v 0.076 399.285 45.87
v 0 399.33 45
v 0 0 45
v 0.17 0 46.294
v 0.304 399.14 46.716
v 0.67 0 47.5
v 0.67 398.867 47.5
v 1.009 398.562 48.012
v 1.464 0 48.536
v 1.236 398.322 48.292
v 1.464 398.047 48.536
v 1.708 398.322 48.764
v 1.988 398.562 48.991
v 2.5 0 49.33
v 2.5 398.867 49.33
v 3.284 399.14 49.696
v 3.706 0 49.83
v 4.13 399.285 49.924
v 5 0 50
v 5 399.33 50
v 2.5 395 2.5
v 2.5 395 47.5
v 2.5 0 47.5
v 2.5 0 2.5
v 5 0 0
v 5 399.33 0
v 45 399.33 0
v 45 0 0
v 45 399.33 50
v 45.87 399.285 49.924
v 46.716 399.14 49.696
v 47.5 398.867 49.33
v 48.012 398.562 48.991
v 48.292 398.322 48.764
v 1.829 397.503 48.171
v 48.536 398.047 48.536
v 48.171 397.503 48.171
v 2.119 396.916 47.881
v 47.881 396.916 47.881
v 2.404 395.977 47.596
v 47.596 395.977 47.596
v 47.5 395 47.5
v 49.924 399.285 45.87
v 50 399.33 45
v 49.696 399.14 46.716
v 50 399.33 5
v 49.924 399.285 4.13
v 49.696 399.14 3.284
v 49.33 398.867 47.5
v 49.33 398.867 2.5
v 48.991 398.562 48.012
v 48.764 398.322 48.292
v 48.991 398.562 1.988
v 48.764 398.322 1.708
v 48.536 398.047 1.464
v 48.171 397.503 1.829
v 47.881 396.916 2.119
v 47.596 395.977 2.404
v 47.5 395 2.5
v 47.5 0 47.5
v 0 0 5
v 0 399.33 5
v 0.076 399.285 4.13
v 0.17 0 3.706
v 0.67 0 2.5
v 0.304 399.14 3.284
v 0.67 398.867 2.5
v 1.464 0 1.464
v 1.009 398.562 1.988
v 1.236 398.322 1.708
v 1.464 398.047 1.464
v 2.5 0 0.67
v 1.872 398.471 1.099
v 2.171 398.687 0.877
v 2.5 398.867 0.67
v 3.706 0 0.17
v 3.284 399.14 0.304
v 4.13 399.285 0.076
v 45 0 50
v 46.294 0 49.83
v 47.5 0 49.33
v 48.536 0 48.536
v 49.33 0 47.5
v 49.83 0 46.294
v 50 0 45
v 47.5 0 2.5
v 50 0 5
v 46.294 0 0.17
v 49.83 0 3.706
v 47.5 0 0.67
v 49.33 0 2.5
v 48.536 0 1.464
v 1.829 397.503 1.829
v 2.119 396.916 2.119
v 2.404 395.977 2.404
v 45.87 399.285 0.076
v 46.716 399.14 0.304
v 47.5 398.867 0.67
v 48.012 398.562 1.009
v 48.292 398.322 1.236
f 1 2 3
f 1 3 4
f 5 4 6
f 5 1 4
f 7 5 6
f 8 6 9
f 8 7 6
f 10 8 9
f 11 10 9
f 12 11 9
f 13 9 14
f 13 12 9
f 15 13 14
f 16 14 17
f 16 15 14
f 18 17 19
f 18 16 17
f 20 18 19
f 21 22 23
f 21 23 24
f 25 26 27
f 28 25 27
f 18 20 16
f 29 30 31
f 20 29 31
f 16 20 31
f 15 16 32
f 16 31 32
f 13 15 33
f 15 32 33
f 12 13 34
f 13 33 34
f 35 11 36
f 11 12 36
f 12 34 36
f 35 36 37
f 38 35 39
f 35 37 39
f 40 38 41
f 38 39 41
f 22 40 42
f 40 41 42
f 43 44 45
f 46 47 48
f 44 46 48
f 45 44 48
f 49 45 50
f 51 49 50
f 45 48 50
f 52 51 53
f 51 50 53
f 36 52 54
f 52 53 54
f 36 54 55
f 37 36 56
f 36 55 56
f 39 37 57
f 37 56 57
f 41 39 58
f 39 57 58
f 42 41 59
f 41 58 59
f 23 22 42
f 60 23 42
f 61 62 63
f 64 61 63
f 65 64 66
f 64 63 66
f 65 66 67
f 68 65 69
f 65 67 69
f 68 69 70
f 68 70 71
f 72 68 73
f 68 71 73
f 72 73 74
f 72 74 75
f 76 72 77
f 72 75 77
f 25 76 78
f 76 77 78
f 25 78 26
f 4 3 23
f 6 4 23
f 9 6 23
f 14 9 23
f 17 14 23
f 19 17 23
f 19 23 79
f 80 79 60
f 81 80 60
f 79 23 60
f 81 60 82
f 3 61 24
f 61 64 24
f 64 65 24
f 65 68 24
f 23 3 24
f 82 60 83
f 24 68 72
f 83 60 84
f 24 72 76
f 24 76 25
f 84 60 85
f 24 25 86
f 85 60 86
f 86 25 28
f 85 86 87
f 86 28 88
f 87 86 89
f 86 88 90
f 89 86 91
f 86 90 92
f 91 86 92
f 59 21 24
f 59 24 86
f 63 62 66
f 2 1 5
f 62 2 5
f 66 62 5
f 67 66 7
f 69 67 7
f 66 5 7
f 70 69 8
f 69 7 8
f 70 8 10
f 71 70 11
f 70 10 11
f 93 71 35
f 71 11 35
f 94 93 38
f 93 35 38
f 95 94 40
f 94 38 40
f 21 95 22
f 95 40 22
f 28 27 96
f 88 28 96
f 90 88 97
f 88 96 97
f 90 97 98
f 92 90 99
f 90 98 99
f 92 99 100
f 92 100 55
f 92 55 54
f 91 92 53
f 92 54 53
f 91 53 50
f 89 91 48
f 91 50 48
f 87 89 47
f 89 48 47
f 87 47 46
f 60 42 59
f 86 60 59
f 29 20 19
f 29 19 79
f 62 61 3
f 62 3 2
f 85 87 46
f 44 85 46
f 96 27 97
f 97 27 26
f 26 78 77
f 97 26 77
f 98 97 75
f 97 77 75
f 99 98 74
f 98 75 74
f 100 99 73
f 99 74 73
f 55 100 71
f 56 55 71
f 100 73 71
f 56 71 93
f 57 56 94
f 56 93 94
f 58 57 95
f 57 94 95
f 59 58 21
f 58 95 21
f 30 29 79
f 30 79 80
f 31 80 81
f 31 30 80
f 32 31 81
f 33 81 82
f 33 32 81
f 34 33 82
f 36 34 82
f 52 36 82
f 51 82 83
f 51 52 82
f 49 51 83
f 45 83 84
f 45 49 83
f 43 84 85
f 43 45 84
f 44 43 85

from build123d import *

# Parameters (mm, degrees)
SKETCH1_W           = 50
SKETCH1_H           = 400
BOSS_EXTRUDE1_DEPTH = 50
SKETCH2_W           = 45
SKETCH2_H           = 45
CUT_EXTRUDE1_DEPTH  = 407.201920232
FILLET1_R           = 5
FILLET2_R           = 5


with BuildPart() as part:
    # Sketch1 → Boss-Extrude1 (new body)
    with BuildSketch(Plane.XY):
        with Locations((25, 200)):
            Rectangle(SKETCH1_W, SKETCH1_H)
    extrude(amount=BOSS_EXTRUDE1_DEPTH)

    # Sketch2 → Cut-Extrude1 (cut, through all)
    with BuildSketch(Plane(origin=(0, 400, 0), x_dir=(1, 0, 0), z_dir=(0, 1, 0))):
        with Locations((25, -25)):
            Rectangle(SKETCH2_W, SKETCH2_H)
    extrude(amount=-CUT_EXTRUDE1_DEPTH, mode=Mode.SUBTRACT)

    # Fillet1
    fillet1_edges = [part.edges().sort_by_distance(p)[0] for p in [
        (50, 200, 50),
        (0, 200, 50),
        (50, 200, 0),
        (0, 200, 0),
    ]]
    fillet(fillet1_edges, radius=FILLET1_R)

    # Fillet2
    # the kernel refuses this fillet: 5 mm, written as the material it takes off along each edge
    with BuildSketch(Plane(origin=(47.5, 400, 2.5), x_dir=(0, -1, 0), z_dir=(0, 0, 1)), Plane(origin=(47.5, 400, 47.5), x_dir=(0, -1, 0), z_dir=(-1, 0, 0)), Plane(origin=(2.5, 400, 47.5), x_dir=(0, -1, 0), z_dir=(0, 0, -1)), Plane(origin=(2.5, 400, 2.5), x_dir=(0, -1, 0), z_dir=(1, 0, 0))) as fillet2_piece_1:
        with BuildLine():
            CenterArc((FILLET2_R, FILLET2_R), FILLET2_R, 180, 90)
            Line((0, FILLET2_R), (-FILLET2_R * 0.02, FILLET2_R))
            Line((-FILLET2_R * 0.02, FILLET2_R), (-FILLET2_R * 0.02, -FILLET2_R * 0.02))
            Line((-FILLET2_R * 0.02, -FILLET2_R * 0.02), (FILLET2_R, -FILLET2_R * 0.02))
            Line((FILLET2_R, -FILLET2_R * 0.02), (FILLET2_R, 0))
        make_face()
    extrude(amount=45, mode=Mode.SUBTRACT)
    with BuildSketch(Plane(origin=(47.5, 400, -10), x_dir=(0, -1, 0), z_dir=(0, 0, 1))) as fillet2_piece_2a_section:
        with BuildLine():
            CenterArc((FILLET2_R, FILLET2_R), FILLET2_R, 180, 90)
            Line((0, FILLET2_R), (-FILLET2_R * 0.02, FILLET2_R))
            Line((-FILLET2_R * 0.02, FILLET2_R), (-FILLET2_R * 0.02, -FILLET2_R * 0.02))
            Line((-FILLET2_R * 0.02, -FILLET2_R * 0.02), (FILLET2_R, -FILLET2_R * 0.02))
            Line((FILLET2_R, -FILLET2_R * 0.02), (FILLET2_R, 0))
        make_face()
    fillet2_piece_2a = extrude(amount=57.5, mode=Mode.PRIVATE)
    fillet2_piece_2a = split(fillet2_piece_2a, bisect_by=Plane(origin=(48.631975571, 398.868024429, 2.5), z_dir=(0, 0, -1)), keep=Keep.TOP, mode=Mode.PRIVATE)
    with BuildSketch(Plane(origin=(2.5, 400, 2.5), x_dir=(0, -1, 0), z_dir=(1, 0, 0))) as fillet2_piece_2b_section:
        with BuildLine():
            CenterArc((FILLET2_R, FILLET2_R), FILLET2_R, 180, 90)
            Line((0, FILLET2_R), (-FILLET2_R * 0.02, FILLET2_R))
            Line((-FILLET2_R * 0.02, FILLET2_R), (-FILLET2_R * 0.02, -FILLET2_R * 0.02))
            Line((-FILLET2_R * 0.02, -FILLET2_R * 0.02), (FILLET2_R, -FILLET2_R * 0.02))
            Line((FILLET2_R, -FILLET2_R * 0.02), (FILLET2_R, 0))
        make_face()
    fillet2_piece_2b = extrude(amount=57.5, mode=Mode.PRIVATE)
    fillet2_piece_2b = split(fillet2_piece_2b, bisect_by=Plane(origin=(47.5, 398.868024429, 1.368024429), z_dir=(1, 0, 0)), keep=Keep.TOP, mode=Mode.PRIVATE)
    fillet2_piece_2 = fillet2_piece_2a & fillet2_piece_2b
    add(fillet2_piece_2, mode=Mode.SUBTRACT)
    with BuildSketch(Plane(origin=(60, 400, 47.5), x_dir=(0, -1, 0), z_dir=(-1, 0, 0))) as fillet2_piece_3a_section:
        with BuildLine():
            CenterArc((FILLET2_R, FILLET2_R), FILLET2_R, 180, 90)
            Line((0, FILLET2_R), (-FILLET2_R * 0.02, FILLET2_R))
            Line((-FILLET2_R * 0.02, FILLET2_R), (-FILLET2_R * 0.02, -FILLET2_R * 0.02))
            Line((-FILLET2_R * 0.02, -FILLET2_R * 0.02), (FILLET2_R, -FILLET2_R * 0.02))
            Line((FILLET2_R, -FILLET2_R * 0.02), (FILLET2_R, 0))
        make_face()
    fillet2_piece_3a = extrude(amount=57.5, mode=Mode.PRIVATE)
    fillet2_piece_3a = split(fillet2_piece_3a, bisect_by=Plane(origin=(47.5, 398.868024429, 48.631975571), z_dir=(1, 0, 0)), keep=Keep.TOP, mode=Mode.PRIVATE)
    with BuildSketch(Plane(origin=(47.5, 400, 2.5), x_dir=(0, -1, 0), z_dir=(0, 0, 1))) as fillet2_piece_3b_section:
        with BuildLine():
            CenterArc((FILLET2_R, FILLET2_R), FILLET2_R, 180, 90)
            Line((0, FILLET2_R), (-FILLET2_R * 0.02, FILLET2_R))
            Line((-FILLET2_R * 0.02, FILLET2_R), (-FILLET2_R * 0.02, -FILLET2_R * 0.02))
            Line((-FILLET2_R * 0.02, -FILLET2_R * 0.02), (FILLET2_R, -FILLET2_R * 0.02))
            Line((FILLET2_R, -FILLET2_R * 0.02), (FILLET2_R, 0))
        make_face()
    fillet2_piece_3b = extrude(amount=57.5, mode=Mode.PRIVATE)
    fillet2_piece_3b = split(fillet2_piece_3b, bisect_by=Plane(origin=(48.631975571, 398.868024429, 47.5), z_dir=(0, 0, 1)), keep=Keep.TOP, mode=Mode.PRIVATE)
    fillet2_piece_3 = fillet2_piece_3a & fillet2_piece_3b
    add(fillet2_piece_3, mode=Mode.SUBTRACT)
    with BuildSketch(Plane(origin=(2.5, 400, 60), x_dir=(0, -1, 0), z_dir=(0, 0, -1))) as fillet2_piece_4a_section:
        with BuildLine():
            CenterArc((FILLET2_R, FILLET2_R), FILLET2_R, 180, 90)
            Line((0, FILLET2_R), (-FILLET2_R * 0.02, FILLET2_R))
            Line((-FILLET2_R * 0.02, FILLET2_R), (-FILLET2_R * 0.02, -FILLET2_R * 0.02))
            Line((-FILLET2_R * 0.02, -FILLET2_R * 0.02), (FILLET2_R, -FILLET2_R * 0.02))
            Line((FILLET2_R, -FILLET2_R * 0.02), (FILLET2_R, 0))
        make_face()
    fillet2_piece_4a = extrude(amount=57.5, mode=Mode.PRIVATE)
    fillet2_piece_4a = split(fillet2_piece_4a, bisect_by=Plane(origin=(1.368024429, 398.868024429, 47.5), z_dir=(0, 0, 1)), keep=Keep.TOP, mode=Mode.PRIVATE)
    with BuildSketch(Plane(origin=(47.5, 400, 47.5), x_dir=(0, -1, 0), z_dir=(-1, 0, 0))) as fillet2_piece_4b_section:
        with BuildLine():
            CenterArc((FILLET2_R, FILLET2_R), FILLET2_R, 180, 90)
            Line((0, FILLET2_R), (-FILLET2_R * 0.02, FILLET2_R))
            Line((-FILLET2_R * 0.02, FILLET2_R), (-FILLET2_R * 0.02, -FILLET2_R * 0.02))
            Line((-FILLET2_R * 0.02, -FILLET2_R * 0.02), (FILLET2_R, -FILLET2_R * 0.02))
            Line((FILLET2_R, -FILLET2_R * 0.02), (FILLET2_R, 0))
        make_face()
    fillet2_piece_4b = extrude(amount=57.5, mode=Mode.PRIVATE)
    fillet2_piece_4b = split(fillet2_piece_4b, bisect_by=Plane(origin=(2.5, 398.868024429, 48.631975571), z_dir=(-1, 0, 0)), keep=Keep.TOP, mode=Mode.PRIVATE)
    fillet2_piece_4 = fillet2_piece_4a & fillet2_piece_4b
    add(fillet2_piece_4, mode=Mode.SUBTRACT)
    with BuildSketch(Plane(origin=(2.5, 400, 47.5), x_dir=(0, -1, 0), z_dir=(0, 0, -1))) as fillet2_piece_5a_section:
        with BuildLine():
            CenterArc((FILLET2_R, FILLET2_R), FILLET2_R, 180, 90)
            Line((0, FILLET2_R), (-FILLET2_R * 0.02, FILLET2_R))
            Line((-FILLET2_R * 0.02, FILLET2_R), (-FILLET2_R * 0.02, -FILLET2_R * 0.02))
            Line((-FILLET2_R * 0.02, -FILLET2_R * 0.02), (FILLET2_R, -FILLET2_R * 0.02))
            Line((FILLET2_R, -FILLET2_R * 0.02), (FILLET2_R, 0))
        make_face()
    fillet2_piece_5a = extrude(amount=57.5, mode=Mode.PRIVATE)
    fillet2_piece_5a = split(fillet2_piece_5a, bisect_by=Plane(origin=(1.368024429, 398.868024429, 2.5), z_dir=(0, 0, -1)), keep=Keep.TOP, mode=Mode.PRIVATE)
    with BuildSketch(Plane(origin=(-10, 400, 2.5), x_dir=(0, -1, 0), z_dir=(1, 0, 0))) as fillet2_piece_5b_section:
        with BuildLine():
            CenterArc((FILLET2_R, FILLET2_R), FILLET2_R, 180, 90)
            Line((0, FILLET2_R), (-FILLET2_R * 0.02, FILLET2_R))
            Line((-FILLET2_R * 0.02, FILLET2_R), (-FILLET2_R * 0.02, -FILLET2_R * 0.02))
            Line((-FILLET2_R * 0.02, -FILLET2_R * 0.02), (FILLET2_R, -FILLET2_R * 0.02))
            Line((FILLET2_R, -FILLET2_R * 0.02), (FILLET2_R, 0))
        make_face()
    fillet2_piece_5b = extrude(amount=57.5, mode=Mode.PRIVATE)
    fillet2_piece_5b = split(fillet2_piece_5b, bisect_by=Plane(origin=(2.5, 398.868024429, 1.368024429), z_dir=(-1, 0, 0)), keep=Keep.TOP, mode=Mode.PRIVATE)
    fillet2_piece_5 = fillet2_piece_5a & fillet2_piece_5b
    add(fillet2_piece_5, mode=Mode.SUBTRACT)


solid = part.part
